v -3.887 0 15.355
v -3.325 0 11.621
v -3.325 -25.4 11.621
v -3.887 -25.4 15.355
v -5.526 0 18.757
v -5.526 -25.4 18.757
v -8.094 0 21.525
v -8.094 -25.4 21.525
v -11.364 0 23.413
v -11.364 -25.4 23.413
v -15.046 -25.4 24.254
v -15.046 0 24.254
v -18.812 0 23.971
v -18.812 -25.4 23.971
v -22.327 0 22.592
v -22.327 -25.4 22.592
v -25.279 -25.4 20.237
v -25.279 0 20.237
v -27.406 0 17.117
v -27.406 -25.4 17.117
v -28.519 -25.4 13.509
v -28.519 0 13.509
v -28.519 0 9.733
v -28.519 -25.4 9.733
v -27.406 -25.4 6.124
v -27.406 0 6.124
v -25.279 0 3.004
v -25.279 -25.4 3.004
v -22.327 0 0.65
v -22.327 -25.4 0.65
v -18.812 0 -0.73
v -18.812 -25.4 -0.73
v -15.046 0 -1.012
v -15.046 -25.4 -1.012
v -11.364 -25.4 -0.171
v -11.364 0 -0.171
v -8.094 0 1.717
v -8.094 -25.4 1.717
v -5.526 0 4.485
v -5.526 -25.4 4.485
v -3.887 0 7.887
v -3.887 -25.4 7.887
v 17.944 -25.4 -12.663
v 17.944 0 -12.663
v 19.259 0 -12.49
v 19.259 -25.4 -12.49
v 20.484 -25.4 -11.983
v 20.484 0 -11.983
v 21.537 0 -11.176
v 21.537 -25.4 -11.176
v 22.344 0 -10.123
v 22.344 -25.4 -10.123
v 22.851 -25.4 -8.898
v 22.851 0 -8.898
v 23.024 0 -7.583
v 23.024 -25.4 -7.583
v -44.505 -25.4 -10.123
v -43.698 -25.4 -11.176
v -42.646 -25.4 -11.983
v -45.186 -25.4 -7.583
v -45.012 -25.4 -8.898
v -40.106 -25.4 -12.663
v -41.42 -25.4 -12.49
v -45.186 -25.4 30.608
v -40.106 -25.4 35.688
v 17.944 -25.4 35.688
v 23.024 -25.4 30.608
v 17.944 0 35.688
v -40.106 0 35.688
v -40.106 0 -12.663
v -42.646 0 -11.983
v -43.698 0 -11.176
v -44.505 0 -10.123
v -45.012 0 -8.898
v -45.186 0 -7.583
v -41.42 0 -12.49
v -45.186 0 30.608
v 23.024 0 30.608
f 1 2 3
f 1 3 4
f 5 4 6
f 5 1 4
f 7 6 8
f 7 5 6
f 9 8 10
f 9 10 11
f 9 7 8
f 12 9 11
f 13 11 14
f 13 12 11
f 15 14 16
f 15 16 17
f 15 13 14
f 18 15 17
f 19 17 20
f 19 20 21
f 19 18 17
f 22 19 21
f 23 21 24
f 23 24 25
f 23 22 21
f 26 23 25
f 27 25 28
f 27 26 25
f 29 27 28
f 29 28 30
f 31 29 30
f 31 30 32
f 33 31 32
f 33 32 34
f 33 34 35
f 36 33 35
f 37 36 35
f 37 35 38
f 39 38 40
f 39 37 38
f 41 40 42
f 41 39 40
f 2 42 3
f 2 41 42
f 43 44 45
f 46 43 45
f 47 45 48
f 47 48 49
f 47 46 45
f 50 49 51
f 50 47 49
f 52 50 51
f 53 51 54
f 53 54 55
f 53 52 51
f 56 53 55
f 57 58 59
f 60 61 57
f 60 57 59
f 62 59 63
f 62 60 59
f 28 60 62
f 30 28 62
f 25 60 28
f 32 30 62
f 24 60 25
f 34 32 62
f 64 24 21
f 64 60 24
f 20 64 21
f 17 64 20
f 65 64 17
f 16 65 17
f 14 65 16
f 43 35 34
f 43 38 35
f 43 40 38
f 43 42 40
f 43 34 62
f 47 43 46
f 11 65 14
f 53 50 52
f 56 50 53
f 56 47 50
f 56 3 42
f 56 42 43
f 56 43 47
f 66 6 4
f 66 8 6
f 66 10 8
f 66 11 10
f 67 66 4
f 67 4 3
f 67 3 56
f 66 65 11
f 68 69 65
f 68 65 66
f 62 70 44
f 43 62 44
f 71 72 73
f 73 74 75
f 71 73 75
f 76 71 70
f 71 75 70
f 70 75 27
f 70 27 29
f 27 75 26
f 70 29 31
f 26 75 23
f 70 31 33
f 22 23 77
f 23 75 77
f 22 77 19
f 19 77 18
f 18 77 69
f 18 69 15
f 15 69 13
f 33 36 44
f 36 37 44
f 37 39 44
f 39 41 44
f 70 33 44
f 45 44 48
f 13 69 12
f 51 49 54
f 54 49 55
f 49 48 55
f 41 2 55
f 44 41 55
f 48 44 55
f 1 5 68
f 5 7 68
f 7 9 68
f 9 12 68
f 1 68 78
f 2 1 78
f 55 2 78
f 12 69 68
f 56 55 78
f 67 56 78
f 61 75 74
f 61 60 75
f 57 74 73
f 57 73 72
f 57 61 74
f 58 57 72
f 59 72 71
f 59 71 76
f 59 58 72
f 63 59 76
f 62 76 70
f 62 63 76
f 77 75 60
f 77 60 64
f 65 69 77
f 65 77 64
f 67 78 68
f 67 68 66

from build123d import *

# Parameters (mm, degrees)
F0_W     = 68.209966
F0_H     = 48.351366
F0_R     = 12.668072
F1_DEPTH = 25.4
F2_SIZE2 = 5.08
F2_SIZE  = 5.08
F3_R     = 5.08


with BuildPart() as f1:
    # F0 (on Front) → F1 (new body)
    with BuildSketch(Plane.XZ):
        with Locations((-11.080523, 11.512229)):
            Rectangle(F0_W, F0_H)
        with Locations((-15.992666, 11.620908)):
            Circle(F0_R, mode=Mode.SUBTRACT)
    extrude(amount=F1_DEPTH)

    # F2
    f2_edges = [f1.edges().sort_by_distance(p)[0] for p in [
        (23.02446, -12.7, 35.687912),
        (-45.185506, -12.7, 35.687912),
    ]]
    chamfer(f2_edges, length=F2_SIZE, length2=F2_SIZE2)

    # F3
    f3_edges = [f1.edges().sort_by_distance(p)[0] for p in [
        (-45.185506, -12.7, -12.663454),
        (23.02446, -12.7, -12.663454),
    ]]
    fillet(f3_edges, radius=F3_R)


solid = f1.part
